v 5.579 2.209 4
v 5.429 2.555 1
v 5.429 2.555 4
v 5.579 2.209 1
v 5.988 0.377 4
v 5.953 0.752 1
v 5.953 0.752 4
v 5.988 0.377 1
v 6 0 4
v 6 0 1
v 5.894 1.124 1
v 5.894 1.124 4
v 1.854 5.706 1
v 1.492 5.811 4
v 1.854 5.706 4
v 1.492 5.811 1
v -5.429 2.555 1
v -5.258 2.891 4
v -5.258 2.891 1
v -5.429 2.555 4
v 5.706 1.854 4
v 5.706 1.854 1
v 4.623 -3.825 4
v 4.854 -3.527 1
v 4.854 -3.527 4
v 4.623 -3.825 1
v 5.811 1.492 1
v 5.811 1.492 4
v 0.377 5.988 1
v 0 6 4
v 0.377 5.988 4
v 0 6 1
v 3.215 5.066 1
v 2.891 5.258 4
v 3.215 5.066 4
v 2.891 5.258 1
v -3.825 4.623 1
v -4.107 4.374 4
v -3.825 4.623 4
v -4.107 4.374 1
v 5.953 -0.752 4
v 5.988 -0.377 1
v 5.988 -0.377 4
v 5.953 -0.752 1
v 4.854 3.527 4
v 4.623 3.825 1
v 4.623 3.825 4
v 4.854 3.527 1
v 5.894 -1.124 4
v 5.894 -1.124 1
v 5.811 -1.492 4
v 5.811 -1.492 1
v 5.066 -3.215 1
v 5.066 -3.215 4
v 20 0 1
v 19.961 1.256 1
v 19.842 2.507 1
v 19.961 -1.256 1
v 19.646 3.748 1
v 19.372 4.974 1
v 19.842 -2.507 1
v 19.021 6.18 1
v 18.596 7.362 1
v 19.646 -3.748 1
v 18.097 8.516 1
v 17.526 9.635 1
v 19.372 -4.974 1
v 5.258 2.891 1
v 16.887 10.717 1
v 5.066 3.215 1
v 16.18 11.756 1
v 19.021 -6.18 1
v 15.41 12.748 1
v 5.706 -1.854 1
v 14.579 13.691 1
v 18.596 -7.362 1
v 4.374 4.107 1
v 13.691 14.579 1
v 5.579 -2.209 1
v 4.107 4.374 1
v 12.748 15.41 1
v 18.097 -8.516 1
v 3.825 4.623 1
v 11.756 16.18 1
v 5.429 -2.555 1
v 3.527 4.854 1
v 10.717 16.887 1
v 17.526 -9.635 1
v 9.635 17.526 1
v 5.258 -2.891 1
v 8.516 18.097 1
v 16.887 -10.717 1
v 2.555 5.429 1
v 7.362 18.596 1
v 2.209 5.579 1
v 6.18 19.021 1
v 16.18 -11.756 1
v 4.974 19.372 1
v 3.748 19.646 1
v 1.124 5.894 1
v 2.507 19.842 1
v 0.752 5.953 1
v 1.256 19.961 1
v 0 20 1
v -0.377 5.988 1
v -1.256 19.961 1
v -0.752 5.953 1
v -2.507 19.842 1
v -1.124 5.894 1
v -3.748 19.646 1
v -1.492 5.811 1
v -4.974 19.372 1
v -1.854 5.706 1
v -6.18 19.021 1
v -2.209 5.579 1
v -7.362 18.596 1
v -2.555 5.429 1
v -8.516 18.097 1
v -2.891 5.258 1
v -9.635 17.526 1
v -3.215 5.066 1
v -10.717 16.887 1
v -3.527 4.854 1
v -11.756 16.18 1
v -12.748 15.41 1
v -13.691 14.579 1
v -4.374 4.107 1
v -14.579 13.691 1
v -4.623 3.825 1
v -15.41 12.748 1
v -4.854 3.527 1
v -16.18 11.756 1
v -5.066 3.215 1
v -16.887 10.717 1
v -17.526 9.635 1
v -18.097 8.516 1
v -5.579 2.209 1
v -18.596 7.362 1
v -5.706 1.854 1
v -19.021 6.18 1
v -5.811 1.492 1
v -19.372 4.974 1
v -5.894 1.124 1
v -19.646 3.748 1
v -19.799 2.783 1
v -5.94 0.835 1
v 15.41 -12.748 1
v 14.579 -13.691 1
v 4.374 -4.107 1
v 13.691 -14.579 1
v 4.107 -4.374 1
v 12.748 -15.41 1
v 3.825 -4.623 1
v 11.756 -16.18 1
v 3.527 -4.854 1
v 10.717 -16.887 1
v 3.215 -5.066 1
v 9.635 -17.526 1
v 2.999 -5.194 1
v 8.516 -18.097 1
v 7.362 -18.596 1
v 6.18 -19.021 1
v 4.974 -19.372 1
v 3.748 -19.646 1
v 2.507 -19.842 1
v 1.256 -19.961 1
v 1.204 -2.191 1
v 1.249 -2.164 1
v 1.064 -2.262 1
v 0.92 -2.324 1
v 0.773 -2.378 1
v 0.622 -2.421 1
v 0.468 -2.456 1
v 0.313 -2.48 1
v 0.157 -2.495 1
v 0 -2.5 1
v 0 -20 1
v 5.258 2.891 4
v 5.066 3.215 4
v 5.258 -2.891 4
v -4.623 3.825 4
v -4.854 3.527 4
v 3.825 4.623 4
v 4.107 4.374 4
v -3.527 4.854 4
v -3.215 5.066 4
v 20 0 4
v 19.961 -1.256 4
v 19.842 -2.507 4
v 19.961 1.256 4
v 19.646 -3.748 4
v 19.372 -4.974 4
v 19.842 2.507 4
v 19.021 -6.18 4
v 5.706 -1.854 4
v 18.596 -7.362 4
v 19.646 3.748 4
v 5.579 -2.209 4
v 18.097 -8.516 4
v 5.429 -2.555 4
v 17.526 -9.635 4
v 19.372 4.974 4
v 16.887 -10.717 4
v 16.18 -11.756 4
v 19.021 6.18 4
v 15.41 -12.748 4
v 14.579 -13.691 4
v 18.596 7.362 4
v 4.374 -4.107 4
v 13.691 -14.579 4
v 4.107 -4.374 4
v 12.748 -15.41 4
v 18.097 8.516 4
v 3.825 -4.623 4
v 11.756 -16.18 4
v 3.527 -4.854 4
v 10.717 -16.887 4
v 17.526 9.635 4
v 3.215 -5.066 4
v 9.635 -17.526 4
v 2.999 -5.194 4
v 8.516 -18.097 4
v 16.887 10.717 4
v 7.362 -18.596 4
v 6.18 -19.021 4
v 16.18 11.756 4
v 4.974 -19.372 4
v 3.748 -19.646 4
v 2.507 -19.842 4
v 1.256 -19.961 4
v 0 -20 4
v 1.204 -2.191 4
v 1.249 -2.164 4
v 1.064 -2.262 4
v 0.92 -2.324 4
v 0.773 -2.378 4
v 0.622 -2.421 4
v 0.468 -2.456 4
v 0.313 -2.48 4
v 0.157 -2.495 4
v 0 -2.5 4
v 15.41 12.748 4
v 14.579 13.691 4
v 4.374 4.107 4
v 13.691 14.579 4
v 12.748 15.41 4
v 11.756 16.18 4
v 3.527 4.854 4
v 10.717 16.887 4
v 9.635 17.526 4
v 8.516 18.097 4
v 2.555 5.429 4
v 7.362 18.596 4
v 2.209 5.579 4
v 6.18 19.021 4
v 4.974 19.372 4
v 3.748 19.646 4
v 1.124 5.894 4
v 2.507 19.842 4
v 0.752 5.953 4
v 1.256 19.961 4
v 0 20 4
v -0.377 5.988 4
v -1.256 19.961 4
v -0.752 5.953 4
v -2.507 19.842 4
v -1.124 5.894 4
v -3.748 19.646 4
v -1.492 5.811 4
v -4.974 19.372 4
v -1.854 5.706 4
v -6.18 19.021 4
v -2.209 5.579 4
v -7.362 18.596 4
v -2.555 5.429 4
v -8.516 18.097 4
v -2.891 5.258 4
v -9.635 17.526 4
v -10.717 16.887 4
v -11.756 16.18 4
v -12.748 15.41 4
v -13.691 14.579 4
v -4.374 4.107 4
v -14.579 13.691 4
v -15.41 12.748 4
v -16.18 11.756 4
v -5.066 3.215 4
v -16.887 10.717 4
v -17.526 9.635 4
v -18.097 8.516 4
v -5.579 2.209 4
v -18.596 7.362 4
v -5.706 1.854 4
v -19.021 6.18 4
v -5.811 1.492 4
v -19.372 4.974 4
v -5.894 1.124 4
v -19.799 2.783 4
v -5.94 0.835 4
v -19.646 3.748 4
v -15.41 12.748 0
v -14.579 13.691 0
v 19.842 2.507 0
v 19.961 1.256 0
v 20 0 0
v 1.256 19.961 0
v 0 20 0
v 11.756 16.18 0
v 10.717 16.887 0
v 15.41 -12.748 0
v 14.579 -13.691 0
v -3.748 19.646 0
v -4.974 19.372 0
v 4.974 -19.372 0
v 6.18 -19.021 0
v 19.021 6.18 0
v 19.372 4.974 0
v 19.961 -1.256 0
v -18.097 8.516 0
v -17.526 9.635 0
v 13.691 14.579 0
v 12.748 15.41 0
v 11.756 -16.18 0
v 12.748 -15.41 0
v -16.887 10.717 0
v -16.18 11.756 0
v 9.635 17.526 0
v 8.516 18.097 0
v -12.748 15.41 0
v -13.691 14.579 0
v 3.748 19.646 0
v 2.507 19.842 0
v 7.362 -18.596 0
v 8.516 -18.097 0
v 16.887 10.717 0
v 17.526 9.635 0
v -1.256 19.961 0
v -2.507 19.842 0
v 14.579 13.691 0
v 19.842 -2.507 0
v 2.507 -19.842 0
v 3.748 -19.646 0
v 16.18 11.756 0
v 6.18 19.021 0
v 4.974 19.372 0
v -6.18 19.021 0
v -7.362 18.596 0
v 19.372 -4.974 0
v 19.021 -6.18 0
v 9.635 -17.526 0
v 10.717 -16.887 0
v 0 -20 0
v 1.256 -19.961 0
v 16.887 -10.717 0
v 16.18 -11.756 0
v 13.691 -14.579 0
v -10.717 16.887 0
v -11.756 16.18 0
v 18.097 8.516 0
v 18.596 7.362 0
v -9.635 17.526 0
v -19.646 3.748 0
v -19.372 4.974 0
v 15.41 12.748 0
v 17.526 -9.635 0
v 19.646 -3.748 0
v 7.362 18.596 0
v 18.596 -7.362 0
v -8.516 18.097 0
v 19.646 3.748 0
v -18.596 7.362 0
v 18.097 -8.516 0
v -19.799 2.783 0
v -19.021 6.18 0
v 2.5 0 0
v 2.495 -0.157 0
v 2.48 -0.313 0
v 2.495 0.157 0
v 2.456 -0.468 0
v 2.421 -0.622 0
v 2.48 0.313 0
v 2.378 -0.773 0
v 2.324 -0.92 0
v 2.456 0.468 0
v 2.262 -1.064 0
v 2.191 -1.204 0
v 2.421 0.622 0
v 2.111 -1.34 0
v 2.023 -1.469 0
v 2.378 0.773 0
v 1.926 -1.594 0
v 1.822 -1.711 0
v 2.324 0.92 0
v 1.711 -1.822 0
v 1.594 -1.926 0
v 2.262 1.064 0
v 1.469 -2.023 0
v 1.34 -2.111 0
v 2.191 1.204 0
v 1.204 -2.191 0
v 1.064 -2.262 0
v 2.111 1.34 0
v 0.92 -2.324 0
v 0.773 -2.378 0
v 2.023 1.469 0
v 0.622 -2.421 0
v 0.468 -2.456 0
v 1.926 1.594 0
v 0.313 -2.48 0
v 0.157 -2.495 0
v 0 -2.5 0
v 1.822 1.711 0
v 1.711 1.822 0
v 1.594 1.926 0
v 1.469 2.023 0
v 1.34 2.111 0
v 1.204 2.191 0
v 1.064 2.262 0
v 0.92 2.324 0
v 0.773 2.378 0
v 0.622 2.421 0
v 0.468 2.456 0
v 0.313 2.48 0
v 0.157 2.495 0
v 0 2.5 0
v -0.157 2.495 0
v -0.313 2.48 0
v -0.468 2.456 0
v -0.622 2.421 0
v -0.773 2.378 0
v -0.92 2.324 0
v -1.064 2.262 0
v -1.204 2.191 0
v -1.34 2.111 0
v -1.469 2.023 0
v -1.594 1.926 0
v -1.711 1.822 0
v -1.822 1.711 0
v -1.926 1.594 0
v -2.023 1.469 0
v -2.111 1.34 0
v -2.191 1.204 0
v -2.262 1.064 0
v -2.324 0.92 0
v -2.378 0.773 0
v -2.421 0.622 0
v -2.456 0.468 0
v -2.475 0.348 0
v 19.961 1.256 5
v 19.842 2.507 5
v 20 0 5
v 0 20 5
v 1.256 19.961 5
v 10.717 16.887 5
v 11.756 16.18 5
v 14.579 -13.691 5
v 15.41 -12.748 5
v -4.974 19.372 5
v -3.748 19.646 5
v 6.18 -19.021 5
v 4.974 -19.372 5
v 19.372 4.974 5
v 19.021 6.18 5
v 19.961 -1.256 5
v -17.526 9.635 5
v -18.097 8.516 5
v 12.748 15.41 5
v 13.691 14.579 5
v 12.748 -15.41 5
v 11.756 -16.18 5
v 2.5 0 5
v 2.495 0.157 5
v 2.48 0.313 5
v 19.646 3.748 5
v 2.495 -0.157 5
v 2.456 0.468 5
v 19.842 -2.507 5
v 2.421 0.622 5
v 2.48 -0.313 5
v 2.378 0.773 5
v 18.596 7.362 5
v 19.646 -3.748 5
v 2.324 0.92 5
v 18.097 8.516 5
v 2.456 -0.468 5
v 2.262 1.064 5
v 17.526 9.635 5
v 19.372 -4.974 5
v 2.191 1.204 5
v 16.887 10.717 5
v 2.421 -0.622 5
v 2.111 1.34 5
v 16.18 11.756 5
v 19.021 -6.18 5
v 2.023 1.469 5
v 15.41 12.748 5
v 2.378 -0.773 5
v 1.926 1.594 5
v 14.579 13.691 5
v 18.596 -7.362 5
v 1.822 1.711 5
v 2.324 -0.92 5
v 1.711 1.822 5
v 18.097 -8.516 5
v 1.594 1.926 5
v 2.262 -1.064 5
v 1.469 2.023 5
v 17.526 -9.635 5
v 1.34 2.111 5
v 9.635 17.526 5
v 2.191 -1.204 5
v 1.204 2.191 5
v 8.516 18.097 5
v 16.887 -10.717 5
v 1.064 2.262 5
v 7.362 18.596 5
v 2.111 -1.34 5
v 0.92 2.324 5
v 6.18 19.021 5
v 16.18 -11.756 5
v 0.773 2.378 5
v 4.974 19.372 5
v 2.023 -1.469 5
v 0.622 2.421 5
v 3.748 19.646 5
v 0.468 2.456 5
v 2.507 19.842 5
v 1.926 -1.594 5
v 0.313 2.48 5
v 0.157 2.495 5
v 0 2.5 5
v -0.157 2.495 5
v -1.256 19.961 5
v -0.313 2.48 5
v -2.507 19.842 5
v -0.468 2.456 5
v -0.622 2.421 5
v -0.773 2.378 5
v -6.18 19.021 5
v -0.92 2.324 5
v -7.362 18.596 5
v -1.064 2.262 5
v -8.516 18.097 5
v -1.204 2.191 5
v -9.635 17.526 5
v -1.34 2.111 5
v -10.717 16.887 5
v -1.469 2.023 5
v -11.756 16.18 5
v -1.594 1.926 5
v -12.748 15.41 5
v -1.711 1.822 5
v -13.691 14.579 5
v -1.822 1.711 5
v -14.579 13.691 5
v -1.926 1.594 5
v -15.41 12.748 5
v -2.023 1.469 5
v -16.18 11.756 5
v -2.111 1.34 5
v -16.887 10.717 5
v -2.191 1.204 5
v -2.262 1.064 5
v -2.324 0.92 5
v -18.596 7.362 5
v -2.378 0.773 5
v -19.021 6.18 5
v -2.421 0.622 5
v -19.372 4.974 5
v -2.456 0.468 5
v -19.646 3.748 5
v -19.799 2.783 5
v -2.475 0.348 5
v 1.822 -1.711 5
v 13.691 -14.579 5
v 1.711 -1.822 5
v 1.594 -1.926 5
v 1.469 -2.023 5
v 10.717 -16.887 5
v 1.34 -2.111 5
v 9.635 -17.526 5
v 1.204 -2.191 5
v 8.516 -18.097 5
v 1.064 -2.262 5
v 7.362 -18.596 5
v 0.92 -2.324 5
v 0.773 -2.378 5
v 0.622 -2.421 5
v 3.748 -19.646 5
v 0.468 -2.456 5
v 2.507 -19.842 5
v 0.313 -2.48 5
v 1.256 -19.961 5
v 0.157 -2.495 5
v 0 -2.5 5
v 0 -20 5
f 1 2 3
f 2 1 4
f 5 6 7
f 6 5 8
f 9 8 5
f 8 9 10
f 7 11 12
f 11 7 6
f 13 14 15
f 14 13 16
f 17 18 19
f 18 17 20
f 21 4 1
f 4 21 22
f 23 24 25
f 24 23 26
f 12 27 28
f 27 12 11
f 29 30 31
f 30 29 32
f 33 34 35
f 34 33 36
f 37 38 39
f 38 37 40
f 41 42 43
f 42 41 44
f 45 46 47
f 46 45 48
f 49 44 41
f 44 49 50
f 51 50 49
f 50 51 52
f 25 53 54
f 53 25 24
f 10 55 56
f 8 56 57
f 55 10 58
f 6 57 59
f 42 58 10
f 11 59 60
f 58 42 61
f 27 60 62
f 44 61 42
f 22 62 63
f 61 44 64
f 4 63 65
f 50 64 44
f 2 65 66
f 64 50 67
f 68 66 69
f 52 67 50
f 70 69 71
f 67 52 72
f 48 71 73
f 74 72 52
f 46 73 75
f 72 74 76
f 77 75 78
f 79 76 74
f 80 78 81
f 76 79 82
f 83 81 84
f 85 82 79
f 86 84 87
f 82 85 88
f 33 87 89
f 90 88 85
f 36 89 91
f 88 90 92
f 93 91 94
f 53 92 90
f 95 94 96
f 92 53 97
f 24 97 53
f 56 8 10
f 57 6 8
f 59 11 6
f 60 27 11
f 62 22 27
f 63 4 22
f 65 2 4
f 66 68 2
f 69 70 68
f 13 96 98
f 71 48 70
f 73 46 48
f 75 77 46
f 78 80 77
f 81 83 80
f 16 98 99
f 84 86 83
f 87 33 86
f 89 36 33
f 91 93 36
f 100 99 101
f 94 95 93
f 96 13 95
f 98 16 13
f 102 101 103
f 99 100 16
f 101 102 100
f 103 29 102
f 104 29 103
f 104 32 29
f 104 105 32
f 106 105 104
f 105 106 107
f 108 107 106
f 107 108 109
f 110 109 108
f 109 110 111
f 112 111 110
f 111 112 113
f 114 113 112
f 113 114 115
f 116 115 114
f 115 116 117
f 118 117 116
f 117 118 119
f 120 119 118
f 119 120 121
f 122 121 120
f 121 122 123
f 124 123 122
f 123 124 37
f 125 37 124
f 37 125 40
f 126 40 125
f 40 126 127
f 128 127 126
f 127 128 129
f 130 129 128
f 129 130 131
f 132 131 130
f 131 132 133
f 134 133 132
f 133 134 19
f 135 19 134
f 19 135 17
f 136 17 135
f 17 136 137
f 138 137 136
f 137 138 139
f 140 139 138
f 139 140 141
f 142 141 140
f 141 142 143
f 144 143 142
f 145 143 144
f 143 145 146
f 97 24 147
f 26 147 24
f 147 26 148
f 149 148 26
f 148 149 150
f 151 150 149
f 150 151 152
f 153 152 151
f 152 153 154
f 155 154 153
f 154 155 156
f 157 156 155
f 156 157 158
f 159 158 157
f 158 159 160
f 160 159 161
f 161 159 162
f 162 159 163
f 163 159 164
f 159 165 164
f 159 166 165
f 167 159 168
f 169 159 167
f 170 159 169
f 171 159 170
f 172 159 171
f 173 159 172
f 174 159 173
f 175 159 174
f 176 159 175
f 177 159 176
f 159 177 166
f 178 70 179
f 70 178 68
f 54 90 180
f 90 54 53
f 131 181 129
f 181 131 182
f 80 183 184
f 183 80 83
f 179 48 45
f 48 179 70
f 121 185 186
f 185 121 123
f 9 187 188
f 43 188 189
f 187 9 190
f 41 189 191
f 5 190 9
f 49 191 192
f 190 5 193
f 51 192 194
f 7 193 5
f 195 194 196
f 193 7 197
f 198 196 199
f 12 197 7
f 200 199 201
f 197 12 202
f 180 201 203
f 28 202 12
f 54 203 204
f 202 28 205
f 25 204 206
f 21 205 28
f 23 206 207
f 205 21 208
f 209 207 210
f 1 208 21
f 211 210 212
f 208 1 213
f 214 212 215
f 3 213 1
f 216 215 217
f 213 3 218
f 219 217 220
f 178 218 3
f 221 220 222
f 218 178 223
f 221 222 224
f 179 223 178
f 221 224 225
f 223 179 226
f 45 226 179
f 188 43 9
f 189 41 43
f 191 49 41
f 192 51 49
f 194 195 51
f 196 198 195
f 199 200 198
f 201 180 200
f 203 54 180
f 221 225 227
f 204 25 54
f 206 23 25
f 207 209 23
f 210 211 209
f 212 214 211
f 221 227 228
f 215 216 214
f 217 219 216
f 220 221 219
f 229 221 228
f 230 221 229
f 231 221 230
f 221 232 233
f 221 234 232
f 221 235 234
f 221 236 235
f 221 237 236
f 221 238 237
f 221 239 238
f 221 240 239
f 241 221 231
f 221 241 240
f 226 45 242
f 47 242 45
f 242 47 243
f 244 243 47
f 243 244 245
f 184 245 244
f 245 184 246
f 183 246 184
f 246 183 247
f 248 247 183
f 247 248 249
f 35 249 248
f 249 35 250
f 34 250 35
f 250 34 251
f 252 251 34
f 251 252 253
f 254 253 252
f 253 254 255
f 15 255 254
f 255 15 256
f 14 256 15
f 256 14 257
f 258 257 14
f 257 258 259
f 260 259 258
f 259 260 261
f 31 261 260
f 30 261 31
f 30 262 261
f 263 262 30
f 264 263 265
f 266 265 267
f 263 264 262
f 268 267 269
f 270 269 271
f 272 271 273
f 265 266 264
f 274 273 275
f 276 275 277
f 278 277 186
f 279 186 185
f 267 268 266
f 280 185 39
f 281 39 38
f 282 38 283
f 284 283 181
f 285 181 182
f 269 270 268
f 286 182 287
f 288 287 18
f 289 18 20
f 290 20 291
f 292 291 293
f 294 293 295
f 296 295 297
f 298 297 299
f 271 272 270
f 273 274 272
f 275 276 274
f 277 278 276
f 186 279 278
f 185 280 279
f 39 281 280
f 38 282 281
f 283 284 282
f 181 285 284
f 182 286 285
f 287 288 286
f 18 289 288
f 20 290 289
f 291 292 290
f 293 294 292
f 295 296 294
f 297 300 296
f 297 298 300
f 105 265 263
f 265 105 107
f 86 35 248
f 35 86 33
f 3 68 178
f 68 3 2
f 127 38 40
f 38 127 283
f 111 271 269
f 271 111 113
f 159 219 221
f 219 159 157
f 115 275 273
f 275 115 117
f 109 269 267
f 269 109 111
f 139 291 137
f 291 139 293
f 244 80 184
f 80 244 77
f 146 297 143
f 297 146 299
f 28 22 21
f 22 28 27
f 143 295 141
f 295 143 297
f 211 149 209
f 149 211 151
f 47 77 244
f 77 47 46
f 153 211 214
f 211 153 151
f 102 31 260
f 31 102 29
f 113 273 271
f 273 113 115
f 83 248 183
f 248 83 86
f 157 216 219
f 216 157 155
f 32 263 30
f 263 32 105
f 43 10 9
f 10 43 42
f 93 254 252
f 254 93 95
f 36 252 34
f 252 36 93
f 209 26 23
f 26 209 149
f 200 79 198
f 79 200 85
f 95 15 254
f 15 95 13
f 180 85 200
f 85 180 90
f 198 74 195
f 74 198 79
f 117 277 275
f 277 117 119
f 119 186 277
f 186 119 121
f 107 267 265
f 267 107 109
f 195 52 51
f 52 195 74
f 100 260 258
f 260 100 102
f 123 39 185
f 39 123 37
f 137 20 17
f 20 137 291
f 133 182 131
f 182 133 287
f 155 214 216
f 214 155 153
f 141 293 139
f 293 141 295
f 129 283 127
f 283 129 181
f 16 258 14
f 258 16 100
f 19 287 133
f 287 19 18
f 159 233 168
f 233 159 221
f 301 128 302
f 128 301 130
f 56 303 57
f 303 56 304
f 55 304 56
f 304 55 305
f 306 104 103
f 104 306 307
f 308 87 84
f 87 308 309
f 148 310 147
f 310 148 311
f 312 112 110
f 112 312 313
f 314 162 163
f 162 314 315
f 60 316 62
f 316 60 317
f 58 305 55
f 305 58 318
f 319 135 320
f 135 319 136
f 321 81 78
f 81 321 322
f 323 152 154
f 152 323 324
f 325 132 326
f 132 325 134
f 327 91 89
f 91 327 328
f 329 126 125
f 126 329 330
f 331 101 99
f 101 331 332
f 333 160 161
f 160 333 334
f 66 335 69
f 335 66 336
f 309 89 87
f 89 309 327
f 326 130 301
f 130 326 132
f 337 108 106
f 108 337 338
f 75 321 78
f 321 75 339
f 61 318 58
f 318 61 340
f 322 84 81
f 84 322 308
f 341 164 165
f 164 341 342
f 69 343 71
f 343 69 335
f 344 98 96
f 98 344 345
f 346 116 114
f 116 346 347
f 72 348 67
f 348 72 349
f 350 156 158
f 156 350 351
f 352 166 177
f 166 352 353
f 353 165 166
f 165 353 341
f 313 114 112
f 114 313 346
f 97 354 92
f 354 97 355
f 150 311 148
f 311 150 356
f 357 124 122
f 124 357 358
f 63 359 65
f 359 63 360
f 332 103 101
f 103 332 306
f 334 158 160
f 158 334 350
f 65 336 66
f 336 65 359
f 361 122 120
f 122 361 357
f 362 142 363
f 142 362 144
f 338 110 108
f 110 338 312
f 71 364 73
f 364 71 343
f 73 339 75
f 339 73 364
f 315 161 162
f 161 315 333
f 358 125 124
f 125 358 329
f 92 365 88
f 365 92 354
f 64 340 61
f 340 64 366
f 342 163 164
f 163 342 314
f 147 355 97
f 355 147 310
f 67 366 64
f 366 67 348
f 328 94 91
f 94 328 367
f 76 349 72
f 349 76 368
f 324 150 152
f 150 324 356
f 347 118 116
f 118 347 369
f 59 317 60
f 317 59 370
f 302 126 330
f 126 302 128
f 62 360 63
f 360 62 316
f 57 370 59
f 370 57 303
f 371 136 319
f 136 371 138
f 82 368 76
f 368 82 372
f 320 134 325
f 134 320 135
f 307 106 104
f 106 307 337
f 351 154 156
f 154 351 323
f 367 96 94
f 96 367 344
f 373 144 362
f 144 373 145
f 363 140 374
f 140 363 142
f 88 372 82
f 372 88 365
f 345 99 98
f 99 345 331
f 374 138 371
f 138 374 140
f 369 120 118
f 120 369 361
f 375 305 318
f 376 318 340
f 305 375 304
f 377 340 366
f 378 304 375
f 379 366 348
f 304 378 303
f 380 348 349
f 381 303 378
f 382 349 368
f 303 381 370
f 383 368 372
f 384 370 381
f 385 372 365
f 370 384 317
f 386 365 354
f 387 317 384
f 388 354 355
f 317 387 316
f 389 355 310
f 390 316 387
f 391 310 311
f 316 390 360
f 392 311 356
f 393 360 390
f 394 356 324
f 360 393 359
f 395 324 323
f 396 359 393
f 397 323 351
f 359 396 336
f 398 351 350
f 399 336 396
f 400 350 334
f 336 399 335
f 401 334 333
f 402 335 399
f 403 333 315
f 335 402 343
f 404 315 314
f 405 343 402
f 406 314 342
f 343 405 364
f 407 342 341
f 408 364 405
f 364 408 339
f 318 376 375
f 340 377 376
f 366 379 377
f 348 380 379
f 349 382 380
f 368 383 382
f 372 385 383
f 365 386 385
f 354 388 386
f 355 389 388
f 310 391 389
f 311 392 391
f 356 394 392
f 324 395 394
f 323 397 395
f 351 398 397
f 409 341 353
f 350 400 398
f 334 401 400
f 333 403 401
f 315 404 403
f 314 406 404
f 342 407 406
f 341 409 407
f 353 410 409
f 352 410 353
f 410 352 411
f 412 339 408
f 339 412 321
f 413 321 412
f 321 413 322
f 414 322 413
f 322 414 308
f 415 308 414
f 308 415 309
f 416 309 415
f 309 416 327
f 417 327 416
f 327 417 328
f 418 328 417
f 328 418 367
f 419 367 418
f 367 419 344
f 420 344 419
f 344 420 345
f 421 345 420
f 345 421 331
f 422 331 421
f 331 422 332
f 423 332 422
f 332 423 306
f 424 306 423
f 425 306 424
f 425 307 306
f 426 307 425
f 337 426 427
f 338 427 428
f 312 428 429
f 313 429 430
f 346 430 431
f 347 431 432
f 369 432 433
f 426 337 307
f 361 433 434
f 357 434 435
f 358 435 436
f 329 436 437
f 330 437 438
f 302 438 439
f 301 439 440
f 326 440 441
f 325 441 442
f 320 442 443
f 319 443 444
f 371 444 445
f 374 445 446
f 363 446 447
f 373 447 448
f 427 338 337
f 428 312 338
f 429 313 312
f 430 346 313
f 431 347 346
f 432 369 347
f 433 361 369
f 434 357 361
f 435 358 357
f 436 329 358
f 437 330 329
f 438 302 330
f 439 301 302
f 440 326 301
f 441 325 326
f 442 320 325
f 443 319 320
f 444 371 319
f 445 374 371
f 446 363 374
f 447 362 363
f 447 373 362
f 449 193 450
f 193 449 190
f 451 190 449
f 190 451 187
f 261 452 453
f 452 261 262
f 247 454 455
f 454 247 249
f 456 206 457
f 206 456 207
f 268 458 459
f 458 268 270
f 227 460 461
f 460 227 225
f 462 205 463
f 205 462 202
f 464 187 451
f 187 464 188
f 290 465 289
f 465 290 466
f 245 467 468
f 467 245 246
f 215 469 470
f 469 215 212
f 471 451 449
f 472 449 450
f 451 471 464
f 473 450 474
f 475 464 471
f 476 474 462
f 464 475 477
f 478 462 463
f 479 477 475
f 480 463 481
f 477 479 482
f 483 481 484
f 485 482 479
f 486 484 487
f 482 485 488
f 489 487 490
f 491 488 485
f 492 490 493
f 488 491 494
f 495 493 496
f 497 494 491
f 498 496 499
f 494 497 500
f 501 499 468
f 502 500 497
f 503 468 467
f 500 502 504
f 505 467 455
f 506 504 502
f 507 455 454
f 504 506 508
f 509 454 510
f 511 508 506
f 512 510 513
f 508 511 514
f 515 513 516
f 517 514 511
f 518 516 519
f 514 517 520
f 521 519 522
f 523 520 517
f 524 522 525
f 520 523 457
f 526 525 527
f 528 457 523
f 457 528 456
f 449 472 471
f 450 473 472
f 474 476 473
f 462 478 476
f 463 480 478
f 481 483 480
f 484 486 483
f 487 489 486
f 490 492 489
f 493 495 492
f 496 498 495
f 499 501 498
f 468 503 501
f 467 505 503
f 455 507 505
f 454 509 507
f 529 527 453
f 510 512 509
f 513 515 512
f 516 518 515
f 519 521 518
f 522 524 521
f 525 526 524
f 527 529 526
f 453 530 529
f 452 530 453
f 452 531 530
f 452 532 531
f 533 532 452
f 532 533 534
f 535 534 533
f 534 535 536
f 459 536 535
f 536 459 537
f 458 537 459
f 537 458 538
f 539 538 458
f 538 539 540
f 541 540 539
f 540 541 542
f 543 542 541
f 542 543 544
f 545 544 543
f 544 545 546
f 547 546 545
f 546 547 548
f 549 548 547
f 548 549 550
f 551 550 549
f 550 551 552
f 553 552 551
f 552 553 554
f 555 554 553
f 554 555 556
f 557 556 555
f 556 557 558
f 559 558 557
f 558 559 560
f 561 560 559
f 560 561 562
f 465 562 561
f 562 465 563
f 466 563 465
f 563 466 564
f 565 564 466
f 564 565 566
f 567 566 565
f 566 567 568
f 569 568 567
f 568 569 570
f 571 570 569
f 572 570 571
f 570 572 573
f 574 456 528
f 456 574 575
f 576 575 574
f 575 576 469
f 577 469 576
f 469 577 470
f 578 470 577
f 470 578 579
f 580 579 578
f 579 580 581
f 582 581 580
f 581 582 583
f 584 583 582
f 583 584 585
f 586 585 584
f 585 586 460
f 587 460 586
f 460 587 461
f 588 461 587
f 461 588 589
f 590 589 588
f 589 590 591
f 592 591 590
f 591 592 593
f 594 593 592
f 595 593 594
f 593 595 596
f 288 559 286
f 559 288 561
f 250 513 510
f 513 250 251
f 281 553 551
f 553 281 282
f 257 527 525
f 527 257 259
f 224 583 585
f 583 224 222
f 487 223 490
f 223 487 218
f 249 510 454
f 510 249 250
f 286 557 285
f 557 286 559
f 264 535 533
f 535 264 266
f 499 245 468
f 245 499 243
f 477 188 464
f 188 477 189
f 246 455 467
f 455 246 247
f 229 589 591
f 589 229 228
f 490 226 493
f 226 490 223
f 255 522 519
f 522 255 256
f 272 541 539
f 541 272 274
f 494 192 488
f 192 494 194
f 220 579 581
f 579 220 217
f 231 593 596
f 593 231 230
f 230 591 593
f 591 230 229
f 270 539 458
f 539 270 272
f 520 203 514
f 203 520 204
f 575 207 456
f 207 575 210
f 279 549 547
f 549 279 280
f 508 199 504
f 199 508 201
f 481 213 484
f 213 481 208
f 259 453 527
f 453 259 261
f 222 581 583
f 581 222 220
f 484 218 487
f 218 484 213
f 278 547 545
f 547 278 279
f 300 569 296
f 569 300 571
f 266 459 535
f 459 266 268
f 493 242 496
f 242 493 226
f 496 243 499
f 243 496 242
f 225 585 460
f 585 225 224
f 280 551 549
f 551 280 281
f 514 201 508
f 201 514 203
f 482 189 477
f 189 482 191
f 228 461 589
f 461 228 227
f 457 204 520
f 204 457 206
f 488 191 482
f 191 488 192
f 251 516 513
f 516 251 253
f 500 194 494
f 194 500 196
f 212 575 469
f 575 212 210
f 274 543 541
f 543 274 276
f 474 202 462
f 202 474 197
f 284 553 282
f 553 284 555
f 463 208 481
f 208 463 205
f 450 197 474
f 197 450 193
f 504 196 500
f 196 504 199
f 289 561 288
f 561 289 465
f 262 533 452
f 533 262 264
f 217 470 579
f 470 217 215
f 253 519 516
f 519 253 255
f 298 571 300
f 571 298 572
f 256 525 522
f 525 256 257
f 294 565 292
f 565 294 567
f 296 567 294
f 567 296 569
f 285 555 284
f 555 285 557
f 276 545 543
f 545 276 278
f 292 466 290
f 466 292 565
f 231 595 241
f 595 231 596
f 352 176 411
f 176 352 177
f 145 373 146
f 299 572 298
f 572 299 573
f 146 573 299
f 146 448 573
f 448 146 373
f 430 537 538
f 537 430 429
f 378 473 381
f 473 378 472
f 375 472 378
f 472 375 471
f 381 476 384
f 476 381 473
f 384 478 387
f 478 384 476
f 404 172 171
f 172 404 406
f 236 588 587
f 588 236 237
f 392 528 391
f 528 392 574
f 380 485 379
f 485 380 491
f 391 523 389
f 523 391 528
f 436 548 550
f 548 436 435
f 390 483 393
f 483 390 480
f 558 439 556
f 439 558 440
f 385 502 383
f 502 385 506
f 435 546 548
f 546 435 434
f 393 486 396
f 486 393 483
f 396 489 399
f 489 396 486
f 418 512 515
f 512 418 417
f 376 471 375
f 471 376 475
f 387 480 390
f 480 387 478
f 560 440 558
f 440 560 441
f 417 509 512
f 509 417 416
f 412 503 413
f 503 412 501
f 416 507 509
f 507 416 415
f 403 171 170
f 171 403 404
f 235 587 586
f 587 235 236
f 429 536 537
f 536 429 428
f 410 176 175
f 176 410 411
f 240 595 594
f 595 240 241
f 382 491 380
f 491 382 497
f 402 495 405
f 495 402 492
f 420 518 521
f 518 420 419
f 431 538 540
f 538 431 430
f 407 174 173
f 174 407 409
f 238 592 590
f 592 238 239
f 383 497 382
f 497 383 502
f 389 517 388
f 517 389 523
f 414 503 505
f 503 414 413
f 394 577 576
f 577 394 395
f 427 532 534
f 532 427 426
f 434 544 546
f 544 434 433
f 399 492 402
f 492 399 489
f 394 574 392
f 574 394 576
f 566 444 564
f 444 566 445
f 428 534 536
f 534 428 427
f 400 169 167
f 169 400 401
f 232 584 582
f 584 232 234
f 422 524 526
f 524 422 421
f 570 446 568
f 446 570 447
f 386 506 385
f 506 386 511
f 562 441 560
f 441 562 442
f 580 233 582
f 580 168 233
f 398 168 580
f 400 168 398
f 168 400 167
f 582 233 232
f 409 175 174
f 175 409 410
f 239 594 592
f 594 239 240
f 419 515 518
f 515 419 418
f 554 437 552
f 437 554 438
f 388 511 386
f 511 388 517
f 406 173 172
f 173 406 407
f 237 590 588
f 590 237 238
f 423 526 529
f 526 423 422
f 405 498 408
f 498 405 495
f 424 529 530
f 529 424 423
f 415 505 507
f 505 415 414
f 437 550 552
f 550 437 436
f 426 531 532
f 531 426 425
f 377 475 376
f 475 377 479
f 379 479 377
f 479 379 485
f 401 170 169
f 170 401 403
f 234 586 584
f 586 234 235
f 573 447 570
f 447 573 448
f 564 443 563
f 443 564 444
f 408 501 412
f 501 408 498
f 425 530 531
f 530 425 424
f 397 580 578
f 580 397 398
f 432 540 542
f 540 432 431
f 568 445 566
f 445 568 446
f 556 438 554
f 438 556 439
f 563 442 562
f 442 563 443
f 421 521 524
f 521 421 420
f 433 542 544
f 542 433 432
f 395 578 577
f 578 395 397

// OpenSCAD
// Elevevator Support for RM F104
/* This makes a 3D model for a support for the elevator on the tail.
 * The parameters are given below in mm.
 * The construction method is:
 * 1. make a circular plate,
 * 2. put a circular insert on top of it
 * 3. put another circular plate on top of that.
 * 4. then from all that subtract:
 *    4a. a rod of correct diameter, correctly positioned,
 *    4b. 2 cubes that have been rotated to the proper angles and postioned correctly.
 * 5. the end result is produced by the call to 'support();'
 */

// all dimensions are millimeters
rodDia = 5.0;  // diameter of rod to be glued to support
foamThickness = 5.0; //4.8;  // foam thickness so as to make it flush
plateThickness = 1.0;  // support plates sandwich walls
plateDia = 40.0;   // diameter of plate
insertThickness = foamThickness - 2.0*plateThickness;  // width of the inner piece
insertDia = 12.0; //(plateDia + rodDia)/2.0;  // diameter of inner piece
forAngle = 30.0;  // angle of forward slope insert for fin leading edge
aftAngle = -8.0;  // angle of rearward slope

// do not change these!
epsilon = 50.0;  // used to ensure that there are no close misses
$fn = 100;  // curve resolution

module outerPlate(dia, ht){
    cylinder(d=dia,h=ht);
}


module insertCutter(d,h){
    linear_extrude(height = h*10,center=true,convexity=10,twist=0){
        polygon(points = [[0,0],
                          [sin(forAngle)*(d+epsilon),-cos(forAngle)*(d+epsilon)],
                          [-cos(forAngle)*(d+epsilon),-cos(forAngle)*(d+epsilon)]], 
                convexity=10);
    }
}


module insert(d,t){
    difference(){
        cylinder(d=d,h=t);
        insertCutter(d,t);
    }
}

module rod(d,ht){
    translate([0,0,0]){
        cylinder(d=d,h=ht,center=true);
    }
}


module cutter(d,h){
    linear_extrude(height = h*10,center=true,convexity=10,twist=0){
        polygon(points = [[0,0],
                          [0,-(d+epsilon)],
                          [-(d+epsilon),-(d+epsilon)],
                          [-cos(aftAngle)*(d+epsilon), 
                           -sin(aftAngle)*(d+epsilon)]], 
                convexity=10);
    }
}


module support(){
    difference(){
        union(){
            outerPlate(plateDia,plateThickness);
            translate([0,0,plateThickness]){
                insert(insertDia,insertThickness);
            }
            translate([0,0,plateThickness+insertThickness]){
                outerPlate(plateDia,plateThickness);
            }
        }
        cutter(plateDia,foamThickness*2.0);
        rod(rodDia,foamThickness*3.0);
    }
}
support();
